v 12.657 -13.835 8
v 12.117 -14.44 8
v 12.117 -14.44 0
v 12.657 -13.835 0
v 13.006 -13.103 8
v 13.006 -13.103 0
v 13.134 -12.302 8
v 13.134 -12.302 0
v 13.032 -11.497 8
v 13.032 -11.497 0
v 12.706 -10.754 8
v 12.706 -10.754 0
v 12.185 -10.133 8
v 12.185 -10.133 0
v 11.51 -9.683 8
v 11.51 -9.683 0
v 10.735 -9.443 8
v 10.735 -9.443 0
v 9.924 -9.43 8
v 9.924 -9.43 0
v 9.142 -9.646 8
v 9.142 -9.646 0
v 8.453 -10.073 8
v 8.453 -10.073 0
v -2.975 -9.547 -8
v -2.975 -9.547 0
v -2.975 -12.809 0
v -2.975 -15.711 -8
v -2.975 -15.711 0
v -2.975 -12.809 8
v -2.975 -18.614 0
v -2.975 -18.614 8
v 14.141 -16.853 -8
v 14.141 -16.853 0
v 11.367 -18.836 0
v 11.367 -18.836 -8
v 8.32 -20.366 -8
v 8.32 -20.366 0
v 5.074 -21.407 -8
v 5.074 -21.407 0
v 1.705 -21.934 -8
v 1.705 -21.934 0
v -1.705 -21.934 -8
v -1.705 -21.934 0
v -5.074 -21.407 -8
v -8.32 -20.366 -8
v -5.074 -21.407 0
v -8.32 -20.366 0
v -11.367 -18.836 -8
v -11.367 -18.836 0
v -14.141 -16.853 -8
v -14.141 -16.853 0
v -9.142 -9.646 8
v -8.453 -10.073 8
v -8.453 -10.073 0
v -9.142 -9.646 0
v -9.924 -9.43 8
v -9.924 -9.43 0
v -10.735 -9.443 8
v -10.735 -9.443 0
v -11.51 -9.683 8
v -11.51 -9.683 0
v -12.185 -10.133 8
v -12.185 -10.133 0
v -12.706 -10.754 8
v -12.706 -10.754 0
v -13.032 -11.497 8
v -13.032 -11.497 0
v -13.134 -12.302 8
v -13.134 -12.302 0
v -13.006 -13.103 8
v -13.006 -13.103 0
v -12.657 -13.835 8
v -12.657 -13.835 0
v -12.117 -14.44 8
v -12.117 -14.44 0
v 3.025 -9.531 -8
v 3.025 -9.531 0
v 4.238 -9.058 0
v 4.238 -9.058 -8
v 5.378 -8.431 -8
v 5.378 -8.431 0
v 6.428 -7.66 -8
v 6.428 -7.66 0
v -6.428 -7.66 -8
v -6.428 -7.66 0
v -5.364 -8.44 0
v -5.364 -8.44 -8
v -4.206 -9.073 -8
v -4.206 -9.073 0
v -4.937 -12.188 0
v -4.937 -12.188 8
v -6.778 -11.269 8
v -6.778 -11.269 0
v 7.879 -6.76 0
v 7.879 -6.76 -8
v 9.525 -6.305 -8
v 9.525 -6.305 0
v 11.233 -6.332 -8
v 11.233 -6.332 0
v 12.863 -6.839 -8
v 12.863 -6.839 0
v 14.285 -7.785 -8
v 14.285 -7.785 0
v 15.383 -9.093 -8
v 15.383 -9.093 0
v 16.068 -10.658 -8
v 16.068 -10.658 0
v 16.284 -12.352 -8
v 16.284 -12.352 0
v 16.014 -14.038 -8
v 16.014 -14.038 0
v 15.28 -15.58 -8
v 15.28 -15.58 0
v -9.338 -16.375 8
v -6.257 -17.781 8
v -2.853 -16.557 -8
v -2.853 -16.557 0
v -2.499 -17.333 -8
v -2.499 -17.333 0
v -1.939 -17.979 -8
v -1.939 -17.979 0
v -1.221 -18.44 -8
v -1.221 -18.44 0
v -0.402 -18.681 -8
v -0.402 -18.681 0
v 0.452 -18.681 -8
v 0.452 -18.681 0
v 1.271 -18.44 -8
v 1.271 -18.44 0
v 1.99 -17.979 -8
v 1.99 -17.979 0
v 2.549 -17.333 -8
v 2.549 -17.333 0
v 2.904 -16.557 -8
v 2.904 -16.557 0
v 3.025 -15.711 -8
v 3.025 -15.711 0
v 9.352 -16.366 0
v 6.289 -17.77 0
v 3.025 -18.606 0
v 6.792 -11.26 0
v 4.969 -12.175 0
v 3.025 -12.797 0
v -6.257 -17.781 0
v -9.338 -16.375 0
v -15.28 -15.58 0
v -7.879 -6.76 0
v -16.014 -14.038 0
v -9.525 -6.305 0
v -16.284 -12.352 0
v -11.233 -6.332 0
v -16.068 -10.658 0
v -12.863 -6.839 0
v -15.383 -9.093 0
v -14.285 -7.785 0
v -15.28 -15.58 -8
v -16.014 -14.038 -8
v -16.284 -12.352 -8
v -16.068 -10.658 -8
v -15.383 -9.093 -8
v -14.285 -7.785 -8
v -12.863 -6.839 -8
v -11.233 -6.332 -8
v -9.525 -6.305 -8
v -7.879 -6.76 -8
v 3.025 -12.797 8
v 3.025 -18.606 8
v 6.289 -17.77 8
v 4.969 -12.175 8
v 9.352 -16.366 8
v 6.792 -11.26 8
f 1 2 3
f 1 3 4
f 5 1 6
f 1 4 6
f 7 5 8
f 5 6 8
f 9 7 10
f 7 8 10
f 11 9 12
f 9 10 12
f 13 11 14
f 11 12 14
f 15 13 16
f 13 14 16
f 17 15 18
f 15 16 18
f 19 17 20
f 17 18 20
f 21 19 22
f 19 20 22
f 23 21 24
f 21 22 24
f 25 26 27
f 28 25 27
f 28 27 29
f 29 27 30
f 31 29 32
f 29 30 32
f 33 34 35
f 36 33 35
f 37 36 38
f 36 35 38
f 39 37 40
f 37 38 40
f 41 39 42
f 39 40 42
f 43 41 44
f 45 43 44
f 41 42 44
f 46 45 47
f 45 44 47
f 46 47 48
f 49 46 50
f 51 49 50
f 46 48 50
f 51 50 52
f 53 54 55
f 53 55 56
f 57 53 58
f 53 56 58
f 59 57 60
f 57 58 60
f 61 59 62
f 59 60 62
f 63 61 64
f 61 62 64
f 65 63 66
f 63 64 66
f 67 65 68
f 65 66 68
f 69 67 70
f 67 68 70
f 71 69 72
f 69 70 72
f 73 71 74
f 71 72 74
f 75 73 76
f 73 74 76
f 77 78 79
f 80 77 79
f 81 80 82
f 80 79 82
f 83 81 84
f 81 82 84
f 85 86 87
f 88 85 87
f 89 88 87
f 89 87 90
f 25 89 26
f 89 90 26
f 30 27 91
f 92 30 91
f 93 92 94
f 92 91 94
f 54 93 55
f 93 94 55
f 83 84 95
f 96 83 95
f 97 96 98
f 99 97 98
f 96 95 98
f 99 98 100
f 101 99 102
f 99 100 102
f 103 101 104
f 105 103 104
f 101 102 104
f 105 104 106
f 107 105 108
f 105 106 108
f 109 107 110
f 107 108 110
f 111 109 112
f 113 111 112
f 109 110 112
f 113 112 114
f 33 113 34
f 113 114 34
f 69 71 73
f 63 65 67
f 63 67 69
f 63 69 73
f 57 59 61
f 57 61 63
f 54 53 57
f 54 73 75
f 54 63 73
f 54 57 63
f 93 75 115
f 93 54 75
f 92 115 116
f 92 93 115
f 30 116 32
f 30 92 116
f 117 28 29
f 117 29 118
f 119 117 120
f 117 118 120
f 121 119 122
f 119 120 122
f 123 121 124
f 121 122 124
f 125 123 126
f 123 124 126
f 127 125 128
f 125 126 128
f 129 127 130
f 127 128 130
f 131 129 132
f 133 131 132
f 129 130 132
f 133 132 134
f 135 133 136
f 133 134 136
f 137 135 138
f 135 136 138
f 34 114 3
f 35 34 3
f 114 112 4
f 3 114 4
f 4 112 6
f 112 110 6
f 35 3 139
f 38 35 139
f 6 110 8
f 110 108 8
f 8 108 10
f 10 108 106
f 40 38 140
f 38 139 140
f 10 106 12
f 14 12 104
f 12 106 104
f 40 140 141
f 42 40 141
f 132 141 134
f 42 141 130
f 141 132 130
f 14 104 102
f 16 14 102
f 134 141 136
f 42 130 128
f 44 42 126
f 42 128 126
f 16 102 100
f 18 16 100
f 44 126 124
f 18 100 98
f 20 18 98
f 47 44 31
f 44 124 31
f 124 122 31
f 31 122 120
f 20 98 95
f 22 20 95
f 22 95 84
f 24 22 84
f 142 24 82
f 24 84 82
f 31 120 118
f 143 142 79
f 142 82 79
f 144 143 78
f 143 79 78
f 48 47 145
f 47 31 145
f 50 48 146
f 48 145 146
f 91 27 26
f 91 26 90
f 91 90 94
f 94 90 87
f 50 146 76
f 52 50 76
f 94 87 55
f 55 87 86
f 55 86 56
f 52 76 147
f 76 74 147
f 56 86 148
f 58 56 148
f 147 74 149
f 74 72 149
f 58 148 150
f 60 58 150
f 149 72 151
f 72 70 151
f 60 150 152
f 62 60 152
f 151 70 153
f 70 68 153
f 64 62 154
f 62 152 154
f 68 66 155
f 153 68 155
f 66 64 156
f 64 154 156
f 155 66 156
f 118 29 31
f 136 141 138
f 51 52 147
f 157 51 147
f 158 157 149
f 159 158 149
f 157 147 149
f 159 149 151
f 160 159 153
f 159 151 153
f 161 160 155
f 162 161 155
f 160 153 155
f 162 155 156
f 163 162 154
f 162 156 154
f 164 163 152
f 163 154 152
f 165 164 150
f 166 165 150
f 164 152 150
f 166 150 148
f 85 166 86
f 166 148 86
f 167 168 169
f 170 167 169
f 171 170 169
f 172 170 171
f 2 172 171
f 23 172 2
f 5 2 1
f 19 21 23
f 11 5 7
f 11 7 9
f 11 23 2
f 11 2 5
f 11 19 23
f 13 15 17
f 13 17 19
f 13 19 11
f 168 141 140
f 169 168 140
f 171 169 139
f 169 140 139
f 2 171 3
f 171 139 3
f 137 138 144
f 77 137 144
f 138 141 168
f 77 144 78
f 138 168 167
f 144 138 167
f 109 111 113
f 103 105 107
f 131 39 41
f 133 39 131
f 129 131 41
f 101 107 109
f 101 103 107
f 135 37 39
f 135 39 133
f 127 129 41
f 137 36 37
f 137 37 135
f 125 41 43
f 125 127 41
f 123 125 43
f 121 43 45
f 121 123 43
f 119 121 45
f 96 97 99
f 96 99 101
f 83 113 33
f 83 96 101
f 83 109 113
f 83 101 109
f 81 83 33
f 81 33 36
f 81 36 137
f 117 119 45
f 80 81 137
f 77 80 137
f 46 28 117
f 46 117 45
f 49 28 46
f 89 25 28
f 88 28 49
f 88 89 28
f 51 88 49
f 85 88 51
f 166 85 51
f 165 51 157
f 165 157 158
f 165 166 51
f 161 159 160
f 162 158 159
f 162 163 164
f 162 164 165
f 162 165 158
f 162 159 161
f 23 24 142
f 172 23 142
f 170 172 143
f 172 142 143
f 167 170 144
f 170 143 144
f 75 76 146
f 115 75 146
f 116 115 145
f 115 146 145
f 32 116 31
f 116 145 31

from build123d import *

# Parameters (mm, degrees)
BOSS_EXTRUDE1_DEPTH   = 8
BOSS_EXTRUDE1_2_DEPTH = 8
BOSS_EXTRUDE2_DEPTH   = 8


with BuildPart() as part:
    # Sketch1 → Boss-Extrude1 (new body)
    with BuildSketch(Plane.XY):
        with BuildLine():
            Line((-2.974906864, -18.61376988), (-2.974906864, -12.809076046))
            ThreePointArc((-2.974906864, -12.809076046), (-5.875216569, -11.764536976), (-8.452657067, -10.073484427))
            ThreePointArc((-8.452657067, -10.073484427), (-12.467828418, -10.424766402), (-12.116546443, -14.439937753))
            ThreePointArc((-12.116546443, -14.439937753), (-7.828997981, -17.14728231), (-2.974906864, -18.61376988))
        make_face()
    extrude(amount=BOSS_EXTRUDE1_DEPTH)



with BuildPart() as body_2:
    # Sketch1 → Boss-Extrude1 2 (new body)
    with BuildSketch(Plane.XY):
        with BuildLine():
            ThreePointArc((8.452657067, -10.073484427), (5.898262695, -11.752999497), (3.025093136, -12.797316575))
            Line((3.025093136, -12.797316575), (3.025093136, -18.60567955))
            ThreePointArc((3.025093136, -18.60567955), (7.852112038, -17.136710202), (12.116546443, -14.439937753))
            ThreePointArc((12.116546443, -14.439937753), (12.467828418, -10.424766402), (8.452657067, -10.073484427))
        make_face()
    extrude(amount=BOSS_EXTRUDE1_2_DEPTH)


with BuildPart() as part_1:
    add(part.part)

    add(body_2.part)  # Boss-Extrude2 merges body 2
    # Sketch2 → Boss-Extrude2 (add)
    with BuildSketch(Plane(origin=(0, 0, 0), x_dir=(-1, 0, 0), z_dir=(0, 0, -1))):
        with BuildLine():
            Line((-3.025093136, -15.711422963), (-3.025093136, -12.797316575))
            Line((-3.025093136, -12.797316575), (-3.025093136, -9.53146429))
            ThreePointArc((-3.025093136, -9.53146429), (-4.818177628, -8.762714439), (-6.427876097, -7.660444431))
            ThreePointArc((-6.427876097, -7.660444431), (-14.880868414, -8.399985432), (-14.141327413, -16.852977749))
            ThreePointArc((-14.141327413, -16.852977749), (0, -22), (14.141327413, -16.852977749))
            ThreePointArc((14.141327413, -16.852977749), (14.880868414, -8.399985432), (6.427876097, -7.660444431))
            ThreePointArc((6.427876097, -7.660444431), (4.795110846, -8.775358225), (2.974906864, -9.547247203))
            Line((2.974906864, -9.547247203), (2.974906864, -12.809076046))
            ThreePointArc((2.974906864, -12.809076046), (5.875216569, -11.764536976), (8.452657067, -10.073484427))
            ThreePointArc((8.452657067, -10.073484427), (12.467828418, -10.424766402), (12.116546443, -14.439937753))
            ThreePointArc((12.116546443, -14.439937753), (7.828997981, -17.14728231), (2.974906864, -18.61376988))
            Line((2.974906864, -18.61376988), (2.974906864, -15.711422963))
            ThreePointArc((2.974906864, -15.711422963), (-0.025093136, -18.711422963), (-3.025093136, -15.711422963))
        make_face()
        with BuildLine():
            ThreePointArc((12.116546443, -14.439937753), (12.467828418, -10.424766402), (8.452657067, -10.073484427))
            ThreePointArc((8.452657067, -10.073484427), (5.875216569, -11.764536976), (2.974906864, -12.809076046))
            Line((2.974906864, -12.809076046), (2.974906864, -18.61376988))
            ThreePointArc((2.974906864, -18.61376988), (7.828997981, -17.14728231), (12.116546443, -14.439937753))
        make_face()
    extrude(amount=BOSS_EXTRUDE2_DEPTH)


solid = part_1.part
